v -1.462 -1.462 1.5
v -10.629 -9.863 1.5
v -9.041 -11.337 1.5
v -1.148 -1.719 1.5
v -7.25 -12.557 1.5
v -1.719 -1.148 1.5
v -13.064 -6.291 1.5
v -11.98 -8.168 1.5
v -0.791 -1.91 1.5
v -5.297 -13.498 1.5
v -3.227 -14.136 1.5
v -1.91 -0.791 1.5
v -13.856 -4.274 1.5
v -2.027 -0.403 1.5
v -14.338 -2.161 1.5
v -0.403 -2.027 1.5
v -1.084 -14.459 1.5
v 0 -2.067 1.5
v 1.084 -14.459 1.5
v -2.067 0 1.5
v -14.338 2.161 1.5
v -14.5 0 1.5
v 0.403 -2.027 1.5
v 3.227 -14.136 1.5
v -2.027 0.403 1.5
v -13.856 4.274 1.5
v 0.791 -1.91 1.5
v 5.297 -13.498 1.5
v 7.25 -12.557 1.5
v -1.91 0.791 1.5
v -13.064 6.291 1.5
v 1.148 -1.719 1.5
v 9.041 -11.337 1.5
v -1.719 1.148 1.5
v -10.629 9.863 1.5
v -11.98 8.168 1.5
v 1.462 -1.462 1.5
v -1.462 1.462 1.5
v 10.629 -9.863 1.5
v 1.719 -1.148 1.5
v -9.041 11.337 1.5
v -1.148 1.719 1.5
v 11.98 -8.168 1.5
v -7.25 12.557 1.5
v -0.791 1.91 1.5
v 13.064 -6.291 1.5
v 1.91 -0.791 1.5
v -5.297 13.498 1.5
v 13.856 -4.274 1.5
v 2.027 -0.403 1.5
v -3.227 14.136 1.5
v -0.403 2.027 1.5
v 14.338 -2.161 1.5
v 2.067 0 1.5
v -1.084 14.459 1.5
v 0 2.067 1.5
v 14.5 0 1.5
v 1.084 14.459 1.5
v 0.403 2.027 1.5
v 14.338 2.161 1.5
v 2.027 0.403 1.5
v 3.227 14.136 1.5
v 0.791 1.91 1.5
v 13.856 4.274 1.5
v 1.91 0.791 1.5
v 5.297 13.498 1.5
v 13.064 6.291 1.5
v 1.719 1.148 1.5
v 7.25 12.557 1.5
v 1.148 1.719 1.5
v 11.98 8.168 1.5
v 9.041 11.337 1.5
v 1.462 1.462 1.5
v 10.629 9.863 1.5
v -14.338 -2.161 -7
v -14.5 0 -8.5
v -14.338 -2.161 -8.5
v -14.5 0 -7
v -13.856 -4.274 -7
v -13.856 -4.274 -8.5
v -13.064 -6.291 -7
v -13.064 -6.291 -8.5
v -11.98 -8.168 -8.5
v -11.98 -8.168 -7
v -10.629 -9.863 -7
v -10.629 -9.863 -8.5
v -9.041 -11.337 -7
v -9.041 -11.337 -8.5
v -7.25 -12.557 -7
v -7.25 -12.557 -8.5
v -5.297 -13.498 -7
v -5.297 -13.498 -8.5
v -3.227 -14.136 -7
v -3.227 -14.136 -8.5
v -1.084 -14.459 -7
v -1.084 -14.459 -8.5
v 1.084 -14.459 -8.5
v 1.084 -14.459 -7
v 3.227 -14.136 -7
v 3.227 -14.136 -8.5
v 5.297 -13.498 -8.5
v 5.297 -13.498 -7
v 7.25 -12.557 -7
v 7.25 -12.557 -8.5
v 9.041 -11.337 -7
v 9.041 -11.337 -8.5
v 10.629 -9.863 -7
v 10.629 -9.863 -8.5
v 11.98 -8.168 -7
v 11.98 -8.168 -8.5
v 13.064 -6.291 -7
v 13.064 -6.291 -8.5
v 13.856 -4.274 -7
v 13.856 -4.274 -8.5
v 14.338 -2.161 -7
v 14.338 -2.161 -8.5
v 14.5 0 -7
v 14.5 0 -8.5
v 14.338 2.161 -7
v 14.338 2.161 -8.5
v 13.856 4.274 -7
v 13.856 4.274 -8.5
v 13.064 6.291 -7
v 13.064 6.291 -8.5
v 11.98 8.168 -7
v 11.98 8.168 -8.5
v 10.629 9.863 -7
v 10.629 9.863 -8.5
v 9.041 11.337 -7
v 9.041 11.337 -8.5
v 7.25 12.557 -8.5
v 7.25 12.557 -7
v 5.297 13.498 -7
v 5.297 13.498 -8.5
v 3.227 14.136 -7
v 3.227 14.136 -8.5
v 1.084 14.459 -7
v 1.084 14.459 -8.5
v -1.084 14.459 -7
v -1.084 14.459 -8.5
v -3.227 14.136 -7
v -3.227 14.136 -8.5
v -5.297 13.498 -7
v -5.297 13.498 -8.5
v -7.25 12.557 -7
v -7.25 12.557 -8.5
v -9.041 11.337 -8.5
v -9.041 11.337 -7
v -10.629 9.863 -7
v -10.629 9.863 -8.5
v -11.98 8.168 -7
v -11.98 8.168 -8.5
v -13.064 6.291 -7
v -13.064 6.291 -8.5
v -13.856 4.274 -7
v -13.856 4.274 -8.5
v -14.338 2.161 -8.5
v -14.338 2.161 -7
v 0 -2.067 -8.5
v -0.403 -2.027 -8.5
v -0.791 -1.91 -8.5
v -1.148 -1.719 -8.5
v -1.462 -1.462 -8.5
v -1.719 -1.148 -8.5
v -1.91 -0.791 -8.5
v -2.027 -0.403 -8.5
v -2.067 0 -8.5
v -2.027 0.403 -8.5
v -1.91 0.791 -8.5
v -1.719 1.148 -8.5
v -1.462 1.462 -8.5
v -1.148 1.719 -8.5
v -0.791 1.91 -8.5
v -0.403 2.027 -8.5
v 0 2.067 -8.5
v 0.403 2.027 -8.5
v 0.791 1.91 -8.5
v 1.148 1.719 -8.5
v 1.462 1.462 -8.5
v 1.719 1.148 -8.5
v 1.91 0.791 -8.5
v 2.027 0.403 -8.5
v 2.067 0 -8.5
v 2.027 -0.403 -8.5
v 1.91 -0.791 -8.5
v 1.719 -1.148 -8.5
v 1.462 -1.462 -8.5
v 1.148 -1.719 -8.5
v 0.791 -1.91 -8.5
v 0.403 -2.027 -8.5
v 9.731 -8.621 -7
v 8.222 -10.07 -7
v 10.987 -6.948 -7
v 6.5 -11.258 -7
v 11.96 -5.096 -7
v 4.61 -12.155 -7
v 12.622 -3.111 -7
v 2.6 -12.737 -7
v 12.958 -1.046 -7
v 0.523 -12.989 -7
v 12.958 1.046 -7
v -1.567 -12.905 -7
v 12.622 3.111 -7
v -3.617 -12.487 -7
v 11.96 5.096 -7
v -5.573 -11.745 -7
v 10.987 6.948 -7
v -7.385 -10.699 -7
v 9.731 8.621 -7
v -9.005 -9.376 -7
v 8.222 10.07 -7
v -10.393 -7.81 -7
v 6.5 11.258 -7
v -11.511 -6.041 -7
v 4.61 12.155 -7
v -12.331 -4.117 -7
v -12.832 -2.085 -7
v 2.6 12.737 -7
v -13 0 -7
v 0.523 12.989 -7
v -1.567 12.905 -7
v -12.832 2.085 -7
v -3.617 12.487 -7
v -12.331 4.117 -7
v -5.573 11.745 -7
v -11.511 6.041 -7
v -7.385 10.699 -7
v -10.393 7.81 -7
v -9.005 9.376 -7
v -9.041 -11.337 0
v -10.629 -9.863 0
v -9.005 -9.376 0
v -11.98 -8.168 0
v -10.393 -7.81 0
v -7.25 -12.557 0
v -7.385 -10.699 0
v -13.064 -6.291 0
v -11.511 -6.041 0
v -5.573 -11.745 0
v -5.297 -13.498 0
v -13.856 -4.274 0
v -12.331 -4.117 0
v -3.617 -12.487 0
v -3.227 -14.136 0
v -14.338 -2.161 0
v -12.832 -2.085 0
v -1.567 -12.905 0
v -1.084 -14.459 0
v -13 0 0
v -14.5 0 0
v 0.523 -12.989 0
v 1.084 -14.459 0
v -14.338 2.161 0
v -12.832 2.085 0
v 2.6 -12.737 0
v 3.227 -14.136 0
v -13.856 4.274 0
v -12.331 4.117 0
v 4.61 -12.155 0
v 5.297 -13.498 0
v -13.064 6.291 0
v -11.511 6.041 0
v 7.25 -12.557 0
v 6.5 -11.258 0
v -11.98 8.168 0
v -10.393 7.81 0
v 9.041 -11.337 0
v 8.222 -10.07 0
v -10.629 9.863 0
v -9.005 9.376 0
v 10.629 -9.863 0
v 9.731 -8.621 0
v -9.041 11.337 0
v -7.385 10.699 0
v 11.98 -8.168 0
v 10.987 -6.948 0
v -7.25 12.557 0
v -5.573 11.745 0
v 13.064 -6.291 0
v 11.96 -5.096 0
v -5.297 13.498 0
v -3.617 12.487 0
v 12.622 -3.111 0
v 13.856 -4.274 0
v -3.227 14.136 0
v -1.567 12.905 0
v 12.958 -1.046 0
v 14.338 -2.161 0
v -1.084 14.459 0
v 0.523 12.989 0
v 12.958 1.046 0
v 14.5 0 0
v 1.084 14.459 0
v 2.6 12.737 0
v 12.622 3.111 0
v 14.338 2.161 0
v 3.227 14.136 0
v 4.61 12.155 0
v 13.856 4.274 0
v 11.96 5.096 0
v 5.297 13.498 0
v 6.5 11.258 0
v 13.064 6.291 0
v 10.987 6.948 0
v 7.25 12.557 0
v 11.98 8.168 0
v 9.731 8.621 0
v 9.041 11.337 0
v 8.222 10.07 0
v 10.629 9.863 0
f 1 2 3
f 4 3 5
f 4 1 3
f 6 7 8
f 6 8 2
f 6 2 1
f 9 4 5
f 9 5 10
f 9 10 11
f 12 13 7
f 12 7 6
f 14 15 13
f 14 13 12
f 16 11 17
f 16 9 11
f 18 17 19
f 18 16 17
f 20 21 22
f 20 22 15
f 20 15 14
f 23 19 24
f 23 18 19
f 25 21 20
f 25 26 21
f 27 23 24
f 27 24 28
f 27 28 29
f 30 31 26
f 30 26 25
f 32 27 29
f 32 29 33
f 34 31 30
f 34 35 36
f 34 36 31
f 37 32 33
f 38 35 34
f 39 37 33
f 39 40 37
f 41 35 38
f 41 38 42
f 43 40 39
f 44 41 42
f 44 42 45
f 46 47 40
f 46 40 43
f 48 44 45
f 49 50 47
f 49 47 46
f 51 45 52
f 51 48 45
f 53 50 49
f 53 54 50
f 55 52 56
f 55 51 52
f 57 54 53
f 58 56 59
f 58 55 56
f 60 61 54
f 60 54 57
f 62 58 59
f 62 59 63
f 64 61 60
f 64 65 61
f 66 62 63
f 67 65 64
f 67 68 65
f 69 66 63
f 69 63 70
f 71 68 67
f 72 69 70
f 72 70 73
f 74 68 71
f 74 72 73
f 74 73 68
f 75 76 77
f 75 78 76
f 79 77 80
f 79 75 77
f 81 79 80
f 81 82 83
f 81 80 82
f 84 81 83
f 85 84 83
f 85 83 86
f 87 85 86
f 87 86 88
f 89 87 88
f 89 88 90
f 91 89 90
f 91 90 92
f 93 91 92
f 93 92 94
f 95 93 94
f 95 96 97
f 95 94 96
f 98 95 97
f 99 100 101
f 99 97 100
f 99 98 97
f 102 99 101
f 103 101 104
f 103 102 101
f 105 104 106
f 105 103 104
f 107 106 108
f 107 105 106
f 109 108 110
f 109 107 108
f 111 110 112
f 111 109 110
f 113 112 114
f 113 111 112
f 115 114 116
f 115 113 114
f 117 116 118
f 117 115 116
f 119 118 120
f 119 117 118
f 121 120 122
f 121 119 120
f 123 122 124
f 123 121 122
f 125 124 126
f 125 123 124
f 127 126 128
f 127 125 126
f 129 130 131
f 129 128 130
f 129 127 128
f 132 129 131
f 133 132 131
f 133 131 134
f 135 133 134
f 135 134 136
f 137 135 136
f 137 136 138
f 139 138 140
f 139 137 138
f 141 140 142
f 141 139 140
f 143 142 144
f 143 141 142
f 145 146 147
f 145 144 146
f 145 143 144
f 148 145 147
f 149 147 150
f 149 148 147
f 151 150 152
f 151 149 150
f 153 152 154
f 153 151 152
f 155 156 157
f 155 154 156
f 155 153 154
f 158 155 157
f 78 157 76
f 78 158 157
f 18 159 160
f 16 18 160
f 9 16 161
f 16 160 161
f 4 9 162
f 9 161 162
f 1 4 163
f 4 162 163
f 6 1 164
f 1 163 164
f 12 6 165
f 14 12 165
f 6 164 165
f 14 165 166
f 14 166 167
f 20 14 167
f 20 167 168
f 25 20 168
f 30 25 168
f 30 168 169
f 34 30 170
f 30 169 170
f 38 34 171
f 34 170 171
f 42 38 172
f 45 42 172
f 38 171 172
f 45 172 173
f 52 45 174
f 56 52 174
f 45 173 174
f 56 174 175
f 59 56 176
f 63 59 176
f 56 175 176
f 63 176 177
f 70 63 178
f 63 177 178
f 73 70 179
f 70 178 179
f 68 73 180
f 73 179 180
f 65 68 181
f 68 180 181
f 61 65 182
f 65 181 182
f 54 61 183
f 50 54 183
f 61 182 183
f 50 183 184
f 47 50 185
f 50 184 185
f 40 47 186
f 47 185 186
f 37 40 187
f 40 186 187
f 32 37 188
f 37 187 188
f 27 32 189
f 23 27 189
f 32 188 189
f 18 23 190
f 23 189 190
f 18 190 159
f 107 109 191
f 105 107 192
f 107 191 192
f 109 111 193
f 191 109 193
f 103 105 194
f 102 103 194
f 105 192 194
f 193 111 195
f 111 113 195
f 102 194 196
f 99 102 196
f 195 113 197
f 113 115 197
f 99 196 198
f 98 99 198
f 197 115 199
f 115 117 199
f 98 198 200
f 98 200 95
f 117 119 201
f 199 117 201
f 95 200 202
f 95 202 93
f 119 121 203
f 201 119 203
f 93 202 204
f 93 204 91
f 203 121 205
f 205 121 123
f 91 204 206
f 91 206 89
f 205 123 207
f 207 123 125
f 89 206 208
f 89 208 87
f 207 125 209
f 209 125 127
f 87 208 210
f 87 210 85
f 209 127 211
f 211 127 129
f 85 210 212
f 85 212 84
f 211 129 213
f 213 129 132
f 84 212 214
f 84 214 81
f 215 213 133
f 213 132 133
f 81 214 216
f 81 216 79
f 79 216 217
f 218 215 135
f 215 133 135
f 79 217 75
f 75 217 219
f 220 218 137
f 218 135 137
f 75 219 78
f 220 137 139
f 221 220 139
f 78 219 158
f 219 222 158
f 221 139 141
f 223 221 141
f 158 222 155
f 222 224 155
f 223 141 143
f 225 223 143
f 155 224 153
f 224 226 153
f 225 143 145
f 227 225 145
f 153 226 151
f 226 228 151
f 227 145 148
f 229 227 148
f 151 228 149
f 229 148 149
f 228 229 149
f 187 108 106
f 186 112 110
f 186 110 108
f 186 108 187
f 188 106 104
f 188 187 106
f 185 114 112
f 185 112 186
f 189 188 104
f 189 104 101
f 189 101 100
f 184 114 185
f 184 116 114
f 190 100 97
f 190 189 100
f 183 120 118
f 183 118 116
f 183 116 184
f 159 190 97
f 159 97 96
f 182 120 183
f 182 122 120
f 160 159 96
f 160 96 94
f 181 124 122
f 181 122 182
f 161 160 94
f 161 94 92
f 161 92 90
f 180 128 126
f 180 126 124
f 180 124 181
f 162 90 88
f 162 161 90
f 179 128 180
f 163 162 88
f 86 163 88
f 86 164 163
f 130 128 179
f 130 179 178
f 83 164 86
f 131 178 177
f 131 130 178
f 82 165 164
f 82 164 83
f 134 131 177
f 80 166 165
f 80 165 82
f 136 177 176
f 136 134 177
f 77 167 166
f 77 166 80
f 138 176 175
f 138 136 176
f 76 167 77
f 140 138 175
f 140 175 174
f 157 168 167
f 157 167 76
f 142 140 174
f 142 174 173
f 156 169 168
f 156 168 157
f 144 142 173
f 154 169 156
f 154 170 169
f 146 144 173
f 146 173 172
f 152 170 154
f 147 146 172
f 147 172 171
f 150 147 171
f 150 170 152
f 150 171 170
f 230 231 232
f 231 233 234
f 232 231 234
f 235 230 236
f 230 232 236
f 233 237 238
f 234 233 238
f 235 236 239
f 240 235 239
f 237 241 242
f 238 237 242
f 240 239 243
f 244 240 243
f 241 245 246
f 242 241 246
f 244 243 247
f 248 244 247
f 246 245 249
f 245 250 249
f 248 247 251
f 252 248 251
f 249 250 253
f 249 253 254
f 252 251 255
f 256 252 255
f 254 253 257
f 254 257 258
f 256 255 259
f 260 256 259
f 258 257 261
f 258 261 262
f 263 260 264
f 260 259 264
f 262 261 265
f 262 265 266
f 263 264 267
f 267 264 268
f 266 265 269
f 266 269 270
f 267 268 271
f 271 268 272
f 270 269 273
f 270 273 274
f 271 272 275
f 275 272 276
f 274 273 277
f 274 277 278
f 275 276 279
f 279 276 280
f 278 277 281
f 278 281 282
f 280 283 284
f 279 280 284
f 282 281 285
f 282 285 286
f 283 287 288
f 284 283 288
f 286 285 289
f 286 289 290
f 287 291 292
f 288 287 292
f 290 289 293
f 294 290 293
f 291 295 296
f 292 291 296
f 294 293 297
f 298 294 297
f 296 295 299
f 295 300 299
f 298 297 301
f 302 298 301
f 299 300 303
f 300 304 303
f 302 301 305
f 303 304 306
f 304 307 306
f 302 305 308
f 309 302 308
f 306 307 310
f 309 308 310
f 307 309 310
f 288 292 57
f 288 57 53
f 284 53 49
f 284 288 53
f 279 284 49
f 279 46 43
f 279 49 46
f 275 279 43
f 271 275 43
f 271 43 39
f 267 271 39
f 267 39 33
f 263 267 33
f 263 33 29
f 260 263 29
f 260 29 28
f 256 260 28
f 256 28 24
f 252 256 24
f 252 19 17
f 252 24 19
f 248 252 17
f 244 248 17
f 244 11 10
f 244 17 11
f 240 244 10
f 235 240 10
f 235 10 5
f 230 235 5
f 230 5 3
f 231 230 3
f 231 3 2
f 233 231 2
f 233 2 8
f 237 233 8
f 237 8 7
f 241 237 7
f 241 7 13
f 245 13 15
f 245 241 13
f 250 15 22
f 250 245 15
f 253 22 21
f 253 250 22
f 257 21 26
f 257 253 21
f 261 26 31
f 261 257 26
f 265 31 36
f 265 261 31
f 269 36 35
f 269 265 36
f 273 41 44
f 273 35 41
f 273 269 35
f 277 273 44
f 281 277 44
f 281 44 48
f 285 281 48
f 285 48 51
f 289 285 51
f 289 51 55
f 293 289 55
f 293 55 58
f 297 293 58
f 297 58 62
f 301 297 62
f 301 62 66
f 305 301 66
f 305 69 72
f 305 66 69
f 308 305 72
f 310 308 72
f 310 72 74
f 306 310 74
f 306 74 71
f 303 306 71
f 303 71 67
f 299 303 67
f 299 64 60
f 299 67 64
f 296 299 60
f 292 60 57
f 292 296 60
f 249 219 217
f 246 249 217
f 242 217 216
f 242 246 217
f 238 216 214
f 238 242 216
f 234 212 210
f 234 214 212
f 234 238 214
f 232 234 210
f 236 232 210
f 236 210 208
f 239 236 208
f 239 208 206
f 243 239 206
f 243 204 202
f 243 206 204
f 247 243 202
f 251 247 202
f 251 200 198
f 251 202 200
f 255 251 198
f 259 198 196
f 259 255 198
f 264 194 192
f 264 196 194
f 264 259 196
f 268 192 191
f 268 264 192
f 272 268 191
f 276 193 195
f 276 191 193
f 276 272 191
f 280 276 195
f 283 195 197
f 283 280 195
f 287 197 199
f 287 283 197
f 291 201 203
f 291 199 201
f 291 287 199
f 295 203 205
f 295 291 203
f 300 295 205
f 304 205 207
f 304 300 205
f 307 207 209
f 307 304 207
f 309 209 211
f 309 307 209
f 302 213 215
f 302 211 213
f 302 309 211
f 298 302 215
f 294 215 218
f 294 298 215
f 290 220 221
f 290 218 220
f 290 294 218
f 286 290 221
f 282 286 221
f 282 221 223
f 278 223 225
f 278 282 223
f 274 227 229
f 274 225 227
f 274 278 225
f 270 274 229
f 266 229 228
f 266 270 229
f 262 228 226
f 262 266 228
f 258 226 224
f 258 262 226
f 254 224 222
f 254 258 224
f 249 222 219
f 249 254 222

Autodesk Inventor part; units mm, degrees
ref_plane "YZ Plane" through (0, 0, 0) normal (1, 0, 0) x (0, 1, 0)
ref_plane "XZ Plane" through (0, 0, 0) normal (0, 1, 0) x (-1, 0, 0)
ref_plane "XY Plane" through (0, 0, 0) normal (0, 0, 1) x (1, 0, 0)
sketch "Sketch1" plane through (0, 0, 0) normal (0, 0, 1) x (1, 0, 0)
  circle A0 centre (0, 0) radius 14.5
  dimension "d0" = 29
extrude "Extrusion1" add sketch "Sketch1" along normal blind 1.5
sketch "Sketch2" plane through (0, 0, 0) normal (0, 0, -1) x (-1, 0, 0)
  circle A0 centre (0, 0) radius 14.5 projected
  circle A1 centre (0, 0) radius 13
  dimension "d3" = 26
extrude "Extrusion2" add sketch "Sketch2" along normal blind 7 contours A1
sketch "Sketch3" plane through (0, 0, -7) normal (0, 0, -1) x (-1, 0, 0)
  circle A0 centre (0, 0) radius 13 projected
  circle A1 centre (0, 0) radius 14.5
  dimension "d6" = 29
extrude "Extrusion3" add sketch "Sketch3" along normal blind 1.5 contours A0 | A1
sketch "Sketch4" plane through (0, 0, 1.5) normal (0, 0, 1) x (1, 0, 0)
  circle A0 centre (0, 0) radius 14.5 projected
hole "Hole1" at (0, 0, 1.5) direction (0, 0, -1) diameter 4.134 end through all thread size "M5x0.8" class "6H" standard "ANSI Metric M Profile"
properties part number "20 - Piston" material "Steel AISI 1020 107 HR"
